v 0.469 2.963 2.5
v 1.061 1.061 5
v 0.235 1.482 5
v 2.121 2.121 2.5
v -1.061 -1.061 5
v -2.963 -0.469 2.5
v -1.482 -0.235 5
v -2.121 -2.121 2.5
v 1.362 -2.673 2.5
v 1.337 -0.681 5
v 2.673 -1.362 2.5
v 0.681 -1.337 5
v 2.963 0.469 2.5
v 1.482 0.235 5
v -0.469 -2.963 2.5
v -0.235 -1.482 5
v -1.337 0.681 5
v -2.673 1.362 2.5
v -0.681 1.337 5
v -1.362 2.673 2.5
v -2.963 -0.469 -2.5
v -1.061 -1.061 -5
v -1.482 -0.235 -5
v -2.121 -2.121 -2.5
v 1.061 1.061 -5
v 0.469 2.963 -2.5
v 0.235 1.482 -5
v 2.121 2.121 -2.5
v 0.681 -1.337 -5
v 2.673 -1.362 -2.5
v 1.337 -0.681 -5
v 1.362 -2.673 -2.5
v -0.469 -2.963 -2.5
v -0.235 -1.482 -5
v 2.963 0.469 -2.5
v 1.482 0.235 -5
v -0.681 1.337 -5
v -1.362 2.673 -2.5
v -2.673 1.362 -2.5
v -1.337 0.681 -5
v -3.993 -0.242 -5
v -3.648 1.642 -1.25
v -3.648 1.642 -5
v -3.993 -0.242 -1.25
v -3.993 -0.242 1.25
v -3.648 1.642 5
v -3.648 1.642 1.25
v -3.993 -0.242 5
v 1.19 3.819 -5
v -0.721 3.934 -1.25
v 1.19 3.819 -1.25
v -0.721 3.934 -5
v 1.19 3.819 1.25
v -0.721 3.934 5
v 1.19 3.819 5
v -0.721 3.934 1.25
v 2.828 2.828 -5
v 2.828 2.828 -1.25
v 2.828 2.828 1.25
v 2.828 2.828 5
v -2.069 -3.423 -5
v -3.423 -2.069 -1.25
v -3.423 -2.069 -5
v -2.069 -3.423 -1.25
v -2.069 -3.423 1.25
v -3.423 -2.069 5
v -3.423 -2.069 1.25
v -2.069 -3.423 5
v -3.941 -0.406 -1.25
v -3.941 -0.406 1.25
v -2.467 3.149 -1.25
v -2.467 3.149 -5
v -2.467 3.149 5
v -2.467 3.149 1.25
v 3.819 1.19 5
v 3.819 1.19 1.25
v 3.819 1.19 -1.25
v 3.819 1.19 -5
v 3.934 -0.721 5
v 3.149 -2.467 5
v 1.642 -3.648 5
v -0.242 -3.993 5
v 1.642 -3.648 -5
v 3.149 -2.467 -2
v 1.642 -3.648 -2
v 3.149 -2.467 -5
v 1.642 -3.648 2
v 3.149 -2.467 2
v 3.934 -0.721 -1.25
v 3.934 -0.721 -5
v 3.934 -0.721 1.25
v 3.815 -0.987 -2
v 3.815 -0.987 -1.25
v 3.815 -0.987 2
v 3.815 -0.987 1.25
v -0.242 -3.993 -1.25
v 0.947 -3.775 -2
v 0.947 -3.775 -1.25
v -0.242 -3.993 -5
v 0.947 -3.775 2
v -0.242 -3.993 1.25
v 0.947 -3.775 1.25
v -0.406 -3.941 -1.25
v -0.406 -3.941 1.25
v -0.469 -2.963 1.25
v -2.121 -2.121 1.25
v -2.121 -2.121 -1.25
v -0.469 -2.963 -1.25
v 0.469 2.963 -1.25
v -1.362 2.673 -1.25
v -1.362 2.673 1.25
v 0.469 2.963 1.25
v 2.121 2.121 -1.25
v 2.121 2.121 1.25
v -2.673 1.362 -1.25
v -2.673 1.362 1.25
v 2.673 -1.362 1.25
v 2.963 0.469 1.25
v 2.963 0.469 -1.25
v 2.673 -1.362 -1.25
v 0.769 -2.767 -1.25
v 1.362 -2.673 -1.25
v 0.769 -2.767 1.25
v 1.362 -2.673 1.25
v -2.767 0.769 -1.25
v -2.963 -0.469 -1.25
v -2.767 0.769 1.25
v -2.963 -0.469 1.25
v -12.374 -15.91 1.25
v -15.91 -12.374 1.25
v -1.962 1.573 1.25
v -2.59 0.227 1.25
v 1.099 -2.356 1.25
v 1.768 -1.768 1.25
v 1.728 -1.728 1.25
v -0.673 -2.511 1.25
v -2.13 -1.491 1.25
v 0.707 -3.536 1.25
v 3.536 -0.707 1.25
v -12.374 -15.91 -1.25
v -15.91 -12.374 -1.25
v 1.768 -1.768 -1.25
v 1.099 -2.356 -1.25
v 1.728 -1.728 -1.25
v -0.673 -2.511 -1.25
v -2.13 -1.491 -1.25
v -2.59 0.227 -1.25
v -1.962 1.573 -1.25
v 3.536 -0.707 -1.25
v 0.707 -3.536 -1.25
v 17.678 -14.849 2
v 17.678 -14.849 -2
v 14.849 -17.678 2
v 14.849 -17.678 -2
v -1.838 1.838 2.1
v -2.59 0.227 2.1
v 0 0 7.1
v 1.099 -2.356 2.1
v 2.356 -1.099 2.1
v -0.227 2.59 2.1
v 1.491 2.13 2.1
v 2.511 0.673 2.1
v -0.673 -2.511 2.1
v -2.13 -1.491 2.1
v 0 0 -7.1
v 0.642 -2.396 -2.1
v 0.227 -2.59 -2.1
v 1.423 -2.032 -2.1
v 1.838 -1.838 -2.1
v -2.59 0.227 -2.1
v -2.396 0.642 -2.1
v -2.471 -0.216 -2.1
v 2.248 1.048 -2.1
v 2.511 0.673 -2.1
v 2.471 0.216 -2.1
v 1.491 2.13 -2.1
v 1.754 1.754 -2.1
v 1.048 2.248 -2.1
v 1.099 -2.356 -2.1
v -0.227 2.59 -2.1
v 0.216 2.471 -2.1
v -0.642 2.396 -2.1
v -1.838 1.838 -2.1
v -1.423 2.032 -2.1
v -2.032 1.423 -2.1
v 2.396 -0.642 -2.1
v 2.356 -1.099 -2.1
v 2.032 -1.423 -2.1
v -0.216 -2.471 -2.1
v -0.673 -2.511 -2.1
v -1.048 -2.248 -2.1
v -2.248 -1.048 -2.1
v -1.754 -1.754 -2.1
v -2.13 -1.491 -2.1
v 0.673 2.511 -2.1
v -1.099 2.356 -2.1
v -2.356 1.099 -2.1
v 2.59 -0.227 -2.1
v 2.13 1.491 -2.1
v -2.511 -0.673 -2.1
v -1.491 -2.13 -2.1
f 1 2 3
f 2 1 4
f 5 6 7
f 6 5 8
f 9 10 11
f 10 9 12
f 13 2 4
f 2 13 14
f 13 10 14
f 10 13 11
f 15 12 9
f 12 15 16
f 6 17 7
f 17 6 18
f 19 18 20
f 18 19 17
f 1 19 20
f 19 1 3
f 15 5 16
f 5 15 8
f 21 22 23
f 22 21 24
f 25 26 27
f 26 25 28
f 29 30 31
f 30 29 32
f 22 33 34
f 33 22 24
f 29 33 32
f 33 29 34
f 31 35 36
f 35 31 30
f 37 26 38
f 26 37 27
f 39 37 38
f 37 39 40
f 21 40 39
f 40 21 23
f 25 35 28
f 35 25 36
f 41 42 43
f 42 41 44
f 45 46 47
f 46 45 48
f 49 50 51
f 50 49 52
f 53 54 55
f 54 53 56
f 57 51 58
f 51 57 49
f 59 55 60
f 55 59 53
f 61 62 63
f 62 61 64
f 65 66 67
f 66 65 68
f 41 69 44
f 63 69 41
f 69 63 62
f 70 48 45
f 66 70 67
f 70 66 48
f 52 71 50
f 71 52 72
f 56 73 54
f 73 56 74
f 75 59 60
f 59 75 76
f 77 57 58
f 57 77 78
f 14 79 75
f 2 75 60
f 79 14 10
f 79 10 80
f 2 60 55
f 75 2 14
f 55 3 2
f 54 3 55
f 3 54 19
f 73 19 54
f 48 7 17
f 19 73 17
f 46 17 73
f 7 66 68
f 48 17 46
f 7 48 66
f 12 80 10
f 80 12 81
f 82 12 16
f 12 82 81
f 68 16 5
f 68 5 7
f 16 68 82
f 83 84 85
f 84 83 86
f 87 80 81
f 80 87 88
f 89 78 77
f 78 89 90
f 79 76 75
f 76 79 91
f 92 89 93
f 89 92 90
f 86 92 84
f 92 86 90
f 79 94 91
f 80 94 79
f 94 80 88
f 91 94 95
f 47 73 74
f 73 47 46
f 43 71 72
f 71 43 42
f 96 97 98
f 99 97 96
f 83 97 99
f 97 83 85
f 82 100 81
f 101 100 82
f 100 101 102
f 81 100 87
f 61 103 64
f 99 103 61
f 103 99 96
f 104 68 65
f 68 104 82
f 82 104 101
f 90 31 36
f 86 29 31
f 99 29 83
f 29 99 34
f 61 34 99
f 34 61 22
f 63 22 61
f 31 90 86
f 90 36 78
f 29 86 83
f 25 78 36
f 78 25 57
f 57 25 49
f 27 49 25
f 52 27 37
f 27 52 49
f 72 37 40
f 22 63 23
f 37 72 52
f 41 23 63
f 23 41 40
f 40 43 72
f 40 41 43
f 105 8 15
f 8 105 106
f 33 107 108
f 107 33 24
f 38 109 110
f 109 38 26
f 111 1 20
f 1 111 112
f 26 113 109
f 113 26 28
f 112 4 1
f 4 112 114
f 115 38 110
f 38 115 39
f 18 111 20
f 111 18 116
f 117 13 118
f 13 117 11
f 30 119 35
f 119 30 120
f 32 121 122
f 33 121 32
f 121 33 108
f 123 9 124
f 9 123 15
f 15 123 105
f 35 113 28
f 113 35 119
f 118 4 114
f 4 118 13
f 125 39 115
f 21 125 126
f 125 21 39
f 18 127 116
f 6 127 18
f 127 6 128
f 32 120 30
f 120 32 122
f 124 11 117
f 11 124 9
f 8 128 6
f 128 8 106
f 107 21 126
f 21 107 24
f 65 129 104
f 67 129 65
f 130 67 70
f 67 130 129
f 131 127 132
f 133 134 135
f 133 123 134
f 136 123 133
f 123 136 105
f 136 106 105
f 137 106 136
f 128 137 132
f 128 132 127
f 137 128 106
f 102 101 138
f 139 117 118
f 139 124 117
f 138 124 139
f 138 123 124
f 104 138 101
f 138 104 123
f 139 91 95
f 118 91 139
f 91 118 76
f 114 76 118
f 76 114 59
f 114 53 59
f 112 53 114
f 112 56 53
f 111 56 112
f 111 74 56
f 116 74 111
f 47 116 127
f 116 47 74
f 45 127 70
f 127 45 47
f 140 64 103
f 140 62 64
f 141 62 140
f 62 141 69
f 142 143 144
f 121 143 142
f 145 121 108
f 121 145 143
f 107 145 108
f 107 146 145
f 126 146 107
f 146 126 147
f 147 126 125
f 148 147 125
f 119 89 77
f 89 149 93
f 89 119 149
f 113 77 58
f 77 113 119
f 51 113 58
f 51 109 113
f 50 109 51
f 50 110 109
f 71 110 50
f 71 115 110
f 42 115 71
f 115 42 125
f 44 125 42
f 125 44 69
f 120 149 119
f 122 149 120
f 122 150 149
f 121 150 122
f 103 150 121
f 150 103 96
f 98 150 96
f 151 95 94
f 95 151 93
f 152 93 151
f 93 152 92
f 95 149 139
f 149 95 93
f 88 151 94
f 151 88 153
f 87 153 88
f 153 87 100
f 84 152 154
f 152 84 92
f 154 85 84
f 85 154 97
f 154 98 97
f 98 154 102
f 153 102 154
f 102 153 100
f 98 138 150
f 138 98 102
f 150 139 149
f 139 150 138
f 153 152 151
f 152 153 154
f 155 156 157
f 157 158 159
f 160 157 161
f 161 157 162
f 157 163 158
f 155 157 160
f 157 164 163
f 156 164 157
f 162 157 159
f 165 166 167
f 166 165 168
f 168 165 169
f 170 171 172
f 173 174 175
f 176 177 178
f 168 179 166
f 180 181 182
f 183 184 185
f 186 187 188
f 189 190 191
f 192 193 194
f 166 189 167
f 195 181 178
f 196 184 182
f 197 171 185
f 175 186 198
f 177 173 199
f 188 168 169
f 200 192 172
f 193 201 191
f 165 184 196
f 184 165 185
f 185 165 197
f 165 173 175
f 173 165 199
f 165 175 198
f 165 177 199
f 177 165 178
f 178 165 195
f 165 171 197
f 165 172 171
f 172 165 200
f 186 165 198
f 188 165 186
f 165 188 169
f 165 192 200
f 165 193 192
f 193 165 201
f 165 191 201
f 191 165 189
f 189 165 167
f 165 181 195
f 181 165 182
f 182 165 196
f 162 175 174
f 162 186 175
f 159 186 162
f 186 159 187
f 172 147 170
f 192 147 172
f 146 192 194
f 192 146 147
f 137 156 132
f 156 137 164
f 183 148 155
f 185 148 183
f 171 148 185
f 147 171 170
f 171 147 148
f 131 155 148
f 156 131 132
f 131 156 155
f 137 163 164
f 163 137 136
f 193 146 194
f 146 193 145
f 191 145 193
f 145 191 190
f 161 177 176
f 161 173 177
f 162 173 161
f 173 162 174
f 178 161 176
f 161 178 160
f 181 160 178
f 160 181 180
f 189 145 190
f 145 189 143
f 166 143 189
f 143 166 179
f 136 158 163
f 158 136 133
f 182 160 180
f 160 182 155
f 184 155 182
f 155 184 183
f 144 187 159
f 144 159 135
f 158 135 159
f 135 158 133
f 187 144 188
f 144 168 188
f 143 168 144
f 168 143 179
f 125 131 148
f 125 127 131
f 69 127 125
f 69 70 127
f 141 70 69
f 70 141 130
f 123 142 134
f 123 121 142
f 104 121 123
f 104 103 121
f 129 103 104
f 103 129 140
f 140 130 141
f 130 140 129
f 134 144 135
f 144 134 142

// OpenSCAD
od=8;
id=6;
h=10;
js=h/2;
$fa=20;
arml=20;
t=0.4; // tolerance of joint

rotate([0,0,45]){
    union(){
        difference(){
            cylinder(h=h,d=od,center=true);
            cylinder(h=js,d=id,center=true);
            for(i=[0:2]){
                rotate([0,180*i,0]){
                    translate([0,0,js]){
                        cylinder(h=js,d1=id,d2=0,center=true);
                    }
                }
            }
            translate([0,0,0]){
                cube([od+1,od+1,h/4],center=true);

            }
        }
        translate([0,-(id/2+arml/2),0]){
            cube([od/2,arml,od/2],center=true);
        }
    }

    rotate([0,0,90]){
        union(){
            cylinder(h=js-(t*2),d=id-(t*2),center=true);
            for(i=[0:2]){
                rotate([0,180*i,0]){
                    translate([0,0,js-t]){
                        cylinder(h=js,d1=id-(t*2),d2=0,center=true);
                    }
                }
            }
            translate([0,(arml/2),0]){
                cube([js,arml,js/2],center=true);
            }
        }
    }
}
